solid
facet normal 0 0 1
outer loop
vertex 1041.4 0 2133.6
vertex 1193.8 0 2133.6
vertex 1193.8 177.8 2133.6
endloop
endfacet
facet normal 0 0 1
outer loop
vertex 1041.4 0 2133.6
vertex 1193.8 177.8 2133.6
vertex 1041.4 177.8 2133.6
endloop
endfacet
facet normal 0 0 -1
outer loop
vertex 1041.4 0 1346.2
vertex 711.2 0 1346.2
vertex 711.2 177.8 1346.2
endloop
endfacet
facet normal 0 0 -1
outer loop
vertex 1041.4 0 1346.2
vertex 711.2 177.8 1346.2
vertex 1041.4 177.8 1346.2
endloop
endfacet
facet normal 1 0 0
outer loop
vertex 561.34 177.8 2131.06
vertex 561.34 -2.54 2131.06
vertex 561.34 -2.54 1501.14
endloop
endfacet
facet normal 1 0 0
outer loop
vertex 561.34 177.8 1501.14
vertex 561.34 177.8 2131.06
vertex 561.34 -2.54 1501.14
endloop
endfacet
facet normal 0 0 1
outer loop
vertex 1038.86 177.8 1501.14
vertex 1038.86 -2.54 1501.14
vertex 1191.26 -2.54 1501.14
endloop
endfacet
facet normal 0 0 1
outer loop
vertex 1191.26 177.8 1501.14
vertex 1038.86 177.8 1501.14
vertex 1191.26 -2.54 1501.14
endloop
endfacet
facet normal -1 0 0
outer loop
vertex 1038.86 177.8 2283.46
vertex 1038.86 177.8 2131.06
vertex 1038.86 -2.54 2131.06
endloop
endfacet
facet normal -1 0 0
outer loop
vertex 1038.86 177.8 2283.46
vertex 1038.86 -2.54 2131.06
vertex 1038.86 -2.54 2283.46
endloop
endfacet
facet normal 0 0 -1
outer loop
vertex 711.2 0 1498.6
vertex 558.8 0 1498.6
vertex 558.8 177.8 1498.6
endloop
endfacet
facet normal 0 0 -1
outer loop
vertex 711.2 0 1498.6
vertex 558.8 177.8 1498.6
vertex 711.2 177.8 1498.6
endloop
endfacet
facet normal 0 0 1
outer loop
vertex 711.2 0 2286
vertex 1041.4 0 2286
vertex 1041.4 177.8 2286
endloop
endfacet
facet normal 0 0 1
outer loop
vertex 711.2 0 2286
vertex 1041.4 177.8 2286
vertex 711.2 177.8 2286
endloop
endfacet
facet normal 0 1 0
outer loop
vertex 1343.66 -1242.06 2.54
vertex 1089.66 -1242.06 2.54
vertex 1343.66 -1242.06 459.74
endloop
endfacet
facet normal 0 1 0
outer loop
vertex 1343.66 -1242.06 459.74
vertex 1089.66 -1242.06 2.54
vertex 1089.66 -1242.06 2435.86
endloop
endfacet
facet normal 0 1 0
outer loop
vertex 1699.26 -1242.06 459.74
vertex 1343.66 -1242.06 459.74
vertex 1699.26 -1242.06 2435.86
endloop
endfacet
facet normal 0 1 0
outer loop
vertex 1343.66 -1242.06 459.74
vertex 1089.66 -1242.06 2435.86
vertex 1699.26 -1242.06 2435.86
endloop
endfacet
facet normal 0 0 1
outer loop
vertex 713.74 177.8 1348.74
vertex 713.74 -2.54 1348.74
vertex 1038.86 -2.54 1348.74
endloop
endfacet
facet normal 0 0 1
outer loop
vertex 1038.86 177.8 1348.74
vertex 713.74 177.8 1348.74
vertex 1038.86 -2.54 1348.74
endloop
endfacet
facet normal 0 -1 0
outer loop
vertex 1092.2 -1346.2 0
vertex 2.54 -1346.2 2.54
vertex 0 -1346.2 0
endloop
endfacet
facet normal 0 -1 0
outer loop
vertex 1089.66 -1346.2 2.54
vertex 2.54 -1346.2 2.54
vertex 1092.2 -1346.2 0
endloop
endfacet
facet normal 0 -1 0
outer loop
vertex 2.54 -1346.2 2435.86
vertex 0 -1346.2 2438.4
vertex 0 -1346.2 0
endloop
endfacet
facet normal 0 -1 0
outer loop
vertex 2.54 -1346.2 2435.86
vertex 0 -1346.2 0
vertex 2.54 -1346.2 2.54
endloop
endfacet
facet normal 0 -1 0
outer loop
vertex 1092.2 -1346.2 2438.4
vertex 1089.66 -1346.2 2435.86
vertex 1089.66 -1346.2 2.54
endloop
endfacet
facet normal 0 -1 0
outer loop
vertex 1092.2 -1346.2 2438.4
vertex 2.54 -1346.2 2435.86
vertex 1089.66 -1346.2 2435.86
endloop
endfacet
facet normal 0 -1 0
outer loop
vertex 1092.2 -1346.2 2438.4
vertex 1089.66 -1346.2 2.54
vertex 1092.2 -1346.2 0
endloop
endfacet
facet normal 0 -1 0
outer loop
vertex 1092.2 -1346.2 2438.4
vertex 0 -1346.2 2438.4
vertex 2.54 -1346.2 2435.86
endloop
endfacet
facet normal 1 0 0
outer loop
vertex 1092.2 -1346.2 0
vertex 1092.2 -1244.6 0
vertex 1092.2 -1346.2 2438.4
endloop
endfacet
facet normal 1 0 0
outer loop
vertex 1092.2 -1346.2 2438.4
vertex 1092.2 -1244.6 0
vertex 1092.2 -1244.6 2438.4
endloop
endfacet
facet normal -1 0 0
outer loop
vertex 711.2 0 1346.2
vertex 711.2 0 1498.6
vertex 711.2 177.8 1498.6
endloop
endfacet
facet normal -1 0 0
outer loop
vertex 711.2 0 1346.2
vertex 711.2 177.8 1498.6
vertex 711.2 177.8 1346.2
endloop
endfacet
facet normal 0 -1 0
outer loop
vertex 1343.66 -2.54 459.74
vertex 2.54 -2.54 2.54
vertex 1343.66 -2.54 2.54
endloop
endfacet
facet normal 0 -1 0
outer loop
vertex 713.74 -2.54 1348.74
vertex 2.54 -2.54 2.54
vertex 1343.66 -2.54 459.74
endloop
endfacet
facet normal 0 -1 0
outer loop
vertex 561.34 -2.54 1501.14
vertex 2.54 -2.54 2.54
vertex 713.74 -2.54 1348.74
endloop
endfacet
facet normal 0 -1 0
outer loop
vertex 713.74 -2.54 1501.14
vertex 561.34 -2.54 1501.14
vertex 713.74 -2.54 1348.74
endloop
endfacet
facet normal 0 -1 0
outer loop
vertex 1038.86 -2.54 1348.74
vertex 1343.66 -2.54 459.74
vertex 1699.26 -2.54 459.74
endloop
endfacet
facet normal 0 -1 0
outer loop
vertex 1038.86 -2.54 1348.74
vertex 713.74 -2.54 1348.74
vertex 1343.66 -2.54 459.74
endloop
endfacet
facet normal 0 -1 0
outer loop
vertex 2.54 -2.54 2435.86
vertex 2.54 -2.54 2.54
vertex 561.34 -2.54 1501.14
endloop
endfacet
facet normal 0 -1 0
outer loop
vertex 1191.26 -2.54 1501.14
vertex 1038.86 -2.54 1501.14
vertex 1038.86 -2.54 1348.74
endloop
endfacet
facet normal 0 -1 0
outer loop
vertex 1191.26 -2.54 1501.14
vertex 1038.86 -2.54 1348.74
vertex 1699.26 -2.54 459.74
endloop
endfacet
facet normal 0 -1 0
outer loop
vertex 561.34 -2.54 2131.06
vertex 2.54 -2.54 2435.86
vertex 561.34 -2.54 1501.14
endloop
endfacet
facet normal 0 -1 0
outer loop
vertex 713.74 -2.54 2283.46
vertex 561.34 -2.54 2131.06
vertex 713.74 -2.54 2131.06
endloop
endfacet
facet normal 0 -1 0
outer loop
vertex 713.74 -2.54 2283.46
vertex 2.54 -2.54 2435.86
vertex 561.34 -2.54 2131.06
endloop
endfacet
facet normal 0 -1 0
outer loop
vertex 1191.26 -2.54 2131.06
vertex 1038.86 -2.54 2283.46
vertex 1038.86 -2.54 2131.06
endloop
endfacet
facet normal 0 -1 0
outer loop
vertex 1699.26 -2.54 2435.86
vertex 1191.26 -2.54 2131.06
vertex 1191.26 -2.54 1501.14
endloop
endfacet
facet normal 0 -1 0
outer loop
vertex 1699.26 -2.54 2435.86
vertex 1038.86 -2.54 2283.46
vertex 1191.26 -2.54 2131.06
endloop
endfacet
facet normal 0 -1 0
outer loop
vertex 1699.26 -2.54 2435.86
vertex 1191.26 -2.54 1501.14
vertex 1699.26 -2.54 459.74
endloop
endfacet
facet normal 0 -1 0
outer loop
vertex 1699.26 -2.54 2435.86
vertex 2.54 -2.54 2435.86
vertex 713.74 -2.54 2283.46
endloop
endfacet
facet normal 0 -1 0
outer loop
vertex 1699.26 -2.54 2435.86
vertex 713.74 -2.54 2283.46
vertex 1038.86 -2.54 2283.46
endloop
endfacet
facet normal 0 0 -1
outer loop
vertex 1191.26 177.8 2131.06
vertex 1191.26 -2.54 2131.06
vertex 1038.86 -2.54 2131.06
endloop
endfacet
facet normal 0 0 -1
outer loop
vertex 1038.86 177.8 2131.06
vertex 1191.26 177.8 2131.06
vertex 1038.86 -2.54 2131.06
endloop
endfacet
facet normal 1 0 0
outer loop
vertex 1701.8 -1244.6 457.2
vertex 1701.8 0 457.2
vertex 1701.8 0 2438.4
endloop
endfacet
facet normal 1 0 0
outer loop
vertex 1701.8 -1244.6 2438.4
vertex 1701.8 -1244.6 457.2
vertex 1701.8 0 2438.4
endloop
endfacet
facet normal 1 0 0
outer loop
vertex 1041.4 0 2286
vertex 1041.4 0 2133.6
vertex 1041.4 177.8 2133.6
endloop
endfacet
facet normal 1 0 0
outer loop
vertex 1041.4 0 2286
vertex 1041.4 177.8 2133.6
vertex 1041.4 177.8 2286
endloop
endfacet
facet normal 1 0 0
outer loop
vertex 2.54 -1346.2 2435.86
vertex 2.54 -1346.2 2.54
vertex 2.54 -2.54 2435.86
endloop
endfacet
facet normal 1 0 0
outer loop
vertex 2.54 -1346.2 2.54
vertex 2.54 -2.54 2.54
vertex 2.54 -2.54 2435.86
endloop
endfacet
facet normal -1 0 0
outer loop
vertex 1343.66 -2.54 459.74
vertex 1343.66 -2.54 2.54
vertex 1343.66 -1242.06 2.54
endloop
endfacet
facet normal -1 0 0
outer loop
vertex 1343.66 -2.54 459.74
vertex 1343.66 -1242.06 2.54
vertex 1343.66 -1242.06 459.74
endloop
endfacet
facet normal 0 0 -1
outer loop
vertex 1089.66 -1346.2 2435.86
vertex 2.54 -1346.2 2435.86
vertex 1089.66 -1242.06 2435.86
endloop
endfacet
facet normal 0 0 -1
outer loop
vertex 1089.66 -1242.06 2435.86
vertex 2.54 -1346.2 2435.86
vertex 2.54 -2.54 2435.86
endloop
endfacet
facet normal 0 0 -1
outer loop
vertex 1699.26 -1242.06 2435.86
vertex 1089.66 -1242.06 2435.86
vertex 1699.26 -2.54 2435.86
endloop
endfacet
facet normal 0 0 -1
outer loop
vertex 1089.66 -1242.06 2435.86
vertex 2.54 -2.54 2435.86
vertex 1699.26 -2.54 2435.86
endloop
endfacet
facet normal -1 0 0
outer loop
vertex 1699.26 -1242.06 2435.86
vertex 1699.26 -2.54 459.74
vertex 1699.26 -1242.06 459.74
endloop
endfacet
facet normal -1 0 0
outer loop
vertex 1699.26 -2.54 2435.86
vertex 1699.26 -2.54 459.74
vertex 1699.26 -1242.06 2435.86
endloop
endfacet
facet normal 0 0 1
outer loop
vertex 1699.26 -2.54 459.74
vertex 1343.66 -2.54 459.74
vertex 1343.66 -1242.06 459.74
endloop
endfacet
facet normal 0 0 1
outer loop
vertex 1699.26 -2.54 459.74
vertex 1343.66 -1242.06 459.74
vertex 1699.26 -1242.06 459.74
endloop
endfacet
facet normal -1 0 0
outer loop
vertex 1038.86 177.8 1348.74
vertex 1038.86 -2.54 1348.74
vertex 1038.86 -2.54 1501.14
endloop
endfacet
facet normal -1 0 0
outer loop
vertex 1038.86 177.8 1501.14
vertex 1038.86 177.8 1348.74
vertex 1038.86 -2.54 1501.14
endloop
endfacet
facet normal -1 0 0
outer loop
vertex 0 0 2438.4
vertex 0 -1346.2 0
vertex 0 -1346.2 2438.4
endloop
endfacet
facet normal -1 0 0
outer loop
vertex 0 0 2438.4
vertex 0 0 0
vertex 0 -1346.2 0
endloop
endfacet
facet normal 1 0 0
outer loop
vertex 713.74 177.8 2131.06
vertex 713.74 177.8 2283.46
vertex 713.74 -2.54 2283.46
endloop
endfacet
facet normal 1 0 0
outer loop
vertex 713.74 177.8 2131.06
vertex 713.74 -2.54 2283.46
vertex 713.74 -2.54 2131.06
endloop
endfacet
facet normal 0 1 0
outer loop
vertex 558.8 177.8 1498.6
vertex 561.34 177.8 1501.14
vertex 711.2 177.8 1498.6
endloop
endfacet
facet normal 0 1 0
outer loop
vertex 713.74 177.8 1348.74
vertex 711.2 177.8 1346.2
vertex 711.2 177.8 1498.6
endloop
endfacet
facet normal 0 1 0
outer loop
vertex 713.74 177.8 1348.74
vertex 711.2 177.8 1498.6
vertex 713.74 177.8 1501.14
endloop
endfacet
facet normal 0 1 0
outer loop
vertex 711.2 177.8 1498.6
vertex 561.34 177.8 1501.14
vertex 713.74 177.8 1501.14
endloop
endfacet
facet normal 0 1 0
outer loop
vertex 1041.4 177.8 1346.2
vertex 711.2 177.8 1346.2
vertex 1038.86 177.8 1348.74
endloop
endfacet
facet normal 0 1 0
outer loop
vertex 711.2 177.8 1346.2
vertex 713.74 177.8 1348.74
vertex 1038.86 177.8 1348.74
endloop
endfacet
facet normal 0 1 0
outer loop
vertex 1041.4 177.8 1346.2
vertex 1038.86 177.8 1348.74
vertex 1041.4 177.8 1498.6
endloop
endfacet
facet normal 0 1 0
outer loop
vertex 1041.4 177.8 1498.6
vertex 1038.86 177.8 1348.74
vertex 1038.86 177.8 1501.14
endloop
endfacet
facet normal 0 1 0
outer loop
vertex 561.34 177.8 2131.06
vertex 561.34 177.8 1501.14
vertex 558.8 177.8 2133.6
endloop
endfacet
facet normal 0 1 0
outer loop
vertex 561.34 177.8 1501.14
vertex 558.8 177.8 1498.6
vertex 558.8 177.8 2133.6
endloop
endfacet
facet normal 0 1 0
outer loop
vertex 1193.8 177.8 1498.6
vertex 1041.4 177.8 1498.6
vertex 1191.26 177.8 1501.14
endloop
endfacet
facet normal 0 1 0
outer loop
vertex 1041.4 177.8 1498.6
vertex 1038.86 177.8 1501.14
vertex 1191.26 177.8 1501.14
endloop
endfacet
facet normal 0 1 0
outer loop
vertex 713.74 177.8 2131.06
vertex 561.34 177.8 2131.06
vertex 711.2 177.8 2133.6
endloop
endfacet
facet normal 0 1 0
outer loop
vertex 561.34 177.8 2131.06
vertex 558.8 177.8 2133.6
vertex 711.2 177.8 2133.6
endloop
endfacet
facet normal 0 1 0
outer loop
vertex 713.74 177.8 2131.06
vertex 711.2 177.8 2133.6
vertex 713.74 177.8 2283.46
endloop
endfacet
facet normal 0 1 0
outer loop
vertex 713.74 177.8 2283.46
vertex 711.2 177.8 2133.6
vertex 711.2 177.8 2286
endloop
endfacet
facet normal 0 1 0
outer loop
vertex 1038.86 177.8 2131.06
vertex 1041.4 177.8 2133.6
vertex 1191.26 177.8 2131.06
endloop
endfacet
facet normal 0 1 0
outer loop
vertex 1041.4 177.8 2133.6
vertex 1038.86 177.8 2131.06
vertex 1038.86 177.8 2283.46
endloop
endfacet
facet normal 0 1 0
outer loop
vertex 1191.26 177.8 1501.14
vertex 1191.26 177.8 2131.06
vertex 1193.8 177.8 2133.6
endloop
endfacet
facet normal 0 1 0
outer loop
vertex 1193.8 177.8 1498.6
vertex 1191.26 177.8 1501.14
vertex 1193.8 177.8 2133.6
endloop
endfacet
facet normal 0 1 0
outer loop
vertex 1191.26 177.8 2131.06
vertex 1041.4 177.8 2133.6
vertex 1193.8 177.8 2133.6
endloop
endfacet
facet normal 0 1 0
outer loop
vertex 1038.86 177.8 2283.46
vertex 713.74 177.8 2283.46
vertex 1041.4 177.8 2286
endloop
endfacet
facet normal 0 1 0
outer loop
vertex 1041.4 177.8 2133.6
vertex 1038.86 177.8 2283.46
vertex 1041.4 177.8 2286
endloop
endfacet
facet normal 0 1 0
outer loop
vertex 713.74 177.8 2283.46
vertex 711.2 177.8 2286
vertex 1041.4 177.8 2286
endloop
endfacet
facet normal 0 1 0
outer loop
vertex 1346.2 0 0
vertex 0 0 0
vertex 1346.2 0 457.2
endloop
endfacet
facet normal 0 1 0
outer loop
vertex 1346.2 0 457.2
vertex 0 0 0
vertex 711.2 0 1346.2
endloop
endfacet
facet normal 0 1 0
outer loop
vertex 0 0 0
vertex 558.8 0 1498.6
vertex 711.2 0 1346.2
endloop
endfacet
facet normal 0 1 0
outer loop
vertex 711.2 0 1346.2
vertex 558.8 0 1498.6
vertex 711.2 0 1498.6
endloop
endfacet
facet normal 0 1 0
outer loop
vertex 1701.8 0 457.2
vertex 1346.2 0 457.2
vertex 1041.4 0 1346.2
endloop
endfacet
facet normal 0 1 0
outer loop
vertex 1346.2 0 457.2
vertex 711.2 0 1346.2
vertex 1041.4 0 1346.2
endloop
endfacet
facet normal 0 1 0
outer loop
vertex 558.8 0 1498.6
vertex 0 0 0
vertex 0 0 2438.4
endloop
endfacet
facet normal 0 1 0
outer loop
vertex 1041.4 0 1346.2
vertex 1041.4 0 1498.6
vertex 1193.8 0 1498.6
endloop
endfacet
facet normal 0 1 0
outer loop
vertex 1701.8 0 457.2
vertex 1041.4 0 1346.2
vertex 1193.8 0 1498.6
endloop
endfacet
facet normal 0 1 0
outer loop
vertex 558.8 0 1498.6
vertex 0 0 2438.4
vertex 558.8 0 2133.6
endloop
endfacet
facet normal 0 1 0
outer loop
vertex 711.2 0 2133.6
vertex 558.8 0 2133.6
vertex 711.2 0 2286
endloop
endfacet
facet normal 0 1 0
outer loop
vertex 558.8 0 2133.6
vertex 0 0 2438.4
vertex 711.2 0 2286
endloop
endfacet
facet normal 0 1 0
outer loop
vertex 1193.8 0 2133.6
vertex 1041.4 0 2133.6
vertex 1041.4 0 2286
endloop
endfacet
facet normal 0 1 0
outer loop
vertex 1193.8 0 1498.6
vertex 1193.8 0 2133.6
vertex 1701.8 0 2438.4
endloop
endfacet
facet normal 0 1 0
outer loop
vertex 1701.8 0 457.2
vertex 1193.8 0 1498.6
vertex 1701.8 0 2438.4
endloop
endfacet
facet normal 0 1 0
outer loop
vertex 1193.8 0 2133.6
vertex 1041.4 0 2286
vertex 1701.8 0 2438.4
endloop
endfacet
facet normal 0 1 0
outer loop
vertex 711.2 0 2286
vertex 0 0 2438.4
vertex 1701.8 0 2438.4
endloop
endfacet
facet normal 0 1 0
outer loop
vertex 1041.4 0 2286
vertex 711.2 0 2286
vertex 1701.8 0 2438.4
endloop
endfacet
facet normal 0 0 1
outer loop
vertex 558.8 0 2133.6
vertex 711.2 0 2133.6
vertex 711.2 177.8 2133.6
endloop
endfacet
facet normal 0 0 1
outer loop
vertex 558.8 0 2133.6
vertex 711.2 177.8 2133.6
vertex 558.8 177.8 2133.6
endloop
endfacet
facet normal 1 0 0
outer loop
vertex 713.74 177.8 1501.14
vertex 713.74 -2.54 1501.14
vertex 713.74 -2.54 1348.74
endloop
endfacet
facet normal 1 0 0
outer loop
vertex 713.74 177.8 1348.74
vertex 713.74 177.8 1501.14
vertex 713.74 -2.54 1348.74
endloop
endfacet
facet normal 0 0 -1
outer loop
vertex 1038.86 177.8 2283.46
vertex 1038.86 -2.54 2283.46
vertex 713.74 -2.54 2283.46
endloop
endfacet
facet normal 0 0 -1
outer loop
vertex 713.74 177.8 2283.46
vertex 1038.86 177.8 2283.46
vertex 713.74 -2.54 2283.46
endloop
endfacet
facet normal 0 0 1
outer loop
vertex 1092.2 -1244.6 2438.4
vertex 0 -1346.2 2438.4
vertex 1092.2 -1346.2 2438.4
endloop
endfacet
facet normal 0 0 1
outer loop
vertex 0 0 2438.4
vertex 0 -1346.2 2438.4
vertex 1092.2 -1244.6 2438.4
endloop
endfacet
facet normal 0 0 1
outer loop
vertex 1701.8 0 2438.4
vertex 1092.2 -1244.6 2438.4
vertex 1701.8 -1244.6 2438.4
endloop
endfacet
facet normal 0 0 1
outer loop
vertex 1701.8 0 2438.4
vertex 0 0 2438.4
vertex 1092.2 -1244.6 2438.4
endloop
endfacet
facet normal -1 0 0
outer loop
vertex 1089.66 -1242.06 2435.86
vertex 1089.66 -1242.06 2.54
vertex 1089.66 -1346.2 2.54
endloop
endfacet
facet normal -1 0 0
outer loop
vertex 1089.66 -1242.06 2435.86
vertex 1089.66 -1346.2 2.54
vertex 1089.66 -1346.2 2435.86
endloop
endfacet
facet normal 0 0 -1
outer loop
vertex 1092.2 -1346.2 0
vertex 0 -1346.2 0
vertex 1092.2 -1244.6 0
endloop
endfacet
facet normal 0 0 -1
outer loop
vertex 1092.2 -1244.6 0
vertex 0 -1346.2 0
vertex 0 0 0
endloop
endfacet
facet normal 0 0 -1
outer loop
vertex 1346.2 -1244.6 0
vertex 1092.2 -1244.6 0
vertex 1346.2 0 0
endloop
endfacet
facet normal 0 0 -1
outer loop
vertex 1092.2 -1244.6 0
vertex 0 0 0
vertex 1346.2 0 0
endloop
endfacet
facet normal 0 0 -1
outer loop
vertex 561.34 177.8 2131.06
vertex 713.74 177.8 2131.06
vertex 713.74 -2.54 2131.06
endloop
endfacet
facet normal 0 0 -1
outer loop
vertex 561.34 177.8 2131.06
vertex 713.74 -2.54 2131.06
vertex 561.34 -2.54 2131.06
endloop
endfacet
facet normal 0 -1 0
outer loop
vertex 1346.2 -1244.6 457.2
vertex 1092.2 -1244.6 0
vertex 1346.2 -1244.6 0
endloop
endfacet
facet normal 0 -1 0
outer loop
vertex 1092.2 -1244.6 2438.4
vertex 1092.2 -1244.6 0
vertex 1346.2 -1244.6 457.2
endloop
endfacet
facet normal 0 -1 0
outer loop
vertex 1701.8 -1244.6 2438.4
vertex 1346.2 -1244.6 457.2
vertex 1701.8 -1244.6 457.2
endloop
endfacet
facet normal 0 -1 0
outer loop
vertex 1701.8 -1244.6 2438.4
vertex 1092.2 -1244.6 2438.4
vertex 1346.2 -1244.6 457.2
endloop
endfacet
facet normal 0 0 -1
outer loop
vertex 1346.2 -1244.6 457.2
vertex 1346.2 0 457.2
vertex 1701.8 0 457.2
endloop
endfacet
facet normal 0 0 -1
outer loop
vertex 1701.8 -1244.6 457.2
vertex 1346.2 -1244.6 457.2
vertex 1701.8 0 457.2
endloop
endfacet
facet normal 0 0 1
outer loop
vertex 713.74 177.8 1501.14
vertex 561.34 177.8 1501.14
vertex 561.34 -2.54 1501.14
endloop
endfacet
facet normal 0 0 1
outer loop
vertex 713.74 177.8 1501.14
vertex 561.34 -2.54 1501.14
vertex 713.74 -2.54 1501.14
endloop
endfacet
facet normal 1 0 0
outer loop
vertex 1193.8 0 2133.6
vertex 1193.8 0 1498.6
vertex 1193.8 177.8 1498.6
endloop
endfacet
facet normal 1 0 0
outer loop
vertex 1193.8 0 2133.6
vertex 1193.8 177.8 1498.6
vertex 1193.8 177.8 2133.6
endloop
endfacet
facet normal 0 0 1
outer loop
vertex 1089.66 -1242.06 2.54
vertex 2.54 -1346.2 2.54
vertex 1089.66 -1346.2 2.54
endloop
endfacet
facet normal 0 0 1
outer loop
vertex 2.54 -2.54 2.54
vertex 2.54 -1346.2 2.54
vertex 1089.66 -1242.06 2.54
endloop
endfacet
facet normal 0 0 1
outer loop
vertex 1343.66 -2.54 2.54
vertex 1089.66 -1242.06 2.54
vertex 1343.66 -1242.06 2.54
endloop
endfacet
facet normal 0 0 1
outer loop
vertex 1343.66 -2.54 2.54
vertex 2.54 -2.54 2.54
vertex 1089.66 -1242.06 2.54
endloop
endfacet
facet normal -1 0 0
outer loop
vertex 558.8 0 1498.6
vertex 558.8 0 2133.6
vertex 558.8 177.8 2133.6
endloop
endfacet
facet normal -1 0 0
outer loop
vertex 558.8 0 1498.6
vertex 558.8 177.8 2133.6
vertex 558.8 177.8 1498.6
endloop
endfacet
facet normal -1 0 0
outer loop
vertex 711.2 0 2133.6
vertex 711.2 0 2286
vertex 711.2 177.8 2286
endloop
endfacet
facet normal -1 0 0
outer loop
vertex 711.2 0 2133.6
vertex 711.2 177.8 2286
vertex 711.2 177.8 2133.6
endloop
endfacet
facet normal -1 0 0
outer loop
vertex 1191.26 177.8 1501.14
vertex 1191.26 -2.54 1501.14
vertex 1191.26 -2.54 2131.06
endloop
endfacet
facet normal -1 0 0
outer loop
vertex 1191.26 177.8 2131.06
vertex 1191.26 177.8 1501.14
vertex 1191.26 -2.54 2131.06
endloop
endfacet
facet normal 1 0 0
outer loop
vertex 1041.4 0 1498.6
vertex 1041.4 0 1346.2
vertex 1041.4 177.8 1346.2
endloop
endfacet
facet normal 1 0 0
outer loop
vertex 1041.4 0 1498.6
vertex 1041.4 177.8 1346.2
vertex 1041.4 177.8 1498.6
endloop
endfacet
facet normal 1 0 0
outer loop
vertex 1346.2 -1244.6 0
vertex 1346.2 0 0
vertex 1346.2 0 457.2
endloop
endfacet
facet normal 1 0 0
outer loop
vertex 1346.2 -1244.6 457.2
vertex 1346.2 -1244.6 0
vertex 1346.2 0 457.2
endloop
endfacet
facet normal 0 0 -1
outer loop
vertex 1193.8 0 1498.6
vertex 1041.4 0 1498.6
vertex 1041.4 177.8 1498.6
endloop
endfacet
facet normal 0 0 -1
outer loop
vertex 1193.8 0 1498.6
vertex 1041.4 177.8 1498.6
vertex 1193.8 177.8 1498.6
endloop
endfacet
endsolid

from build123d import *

# Parameters (mm, degrees)
F1_DEPTH = 1244.6
F3_DEPTH = 177.8
F4_W     = 1092.2
F4_H     = 2438.4
F5_DEPTH = 101.6
F6_T     = -2.54


with BuildPart() as f1:
    # F0 (on Front) → F1 (new body)
    with BuildSketch(Plane.XZ):
        Polygon((0, 2438.4), (0, 0), (1346.2, 0), (1346.2, 457.2), (1701.8, 457.2), (1701.8, 2438.4), align=None)
    extrude(amount=F1_DEPTH)

    # F2 (on Front) → F3 (join)
    with BuildSketch(Plane.XZ):
        Polygon((711.2, 1498.6), (711.2, 1346.2), (1041.4, 1346.2), (1041.4, 1498.6), (1193.8, 1498.6), (1193.8, 2133.6), (1041.4, 2133.6), (1041.4, 2286), (711.2, 2286), (711.2, 2133.6), (558.8, 2133.6), (558.8, 1498.6), align=None)
    extrude(amount=-F3_DEPTH)

    # F4 (on face) → F5 (join)
    with BuildSketch(Plane.XZ.offset(1244.6)):
        with Locations((546.1, 1219.2)):
            Rectangle(F4_W, F4_H)
    extrude(amount=F5_DEPTH)

    # F6
    f6_openings = [f1.faces().sort_by_distance(p)[0] for p in [
        (546.1, -1346.2, 1219.2),
        (876.3, 177.8, 1816.1),
    ]]
    offset(amount=F6_T, openings=f6_openings, kind=Kind.INTERSECTION)


solid = f1.part
